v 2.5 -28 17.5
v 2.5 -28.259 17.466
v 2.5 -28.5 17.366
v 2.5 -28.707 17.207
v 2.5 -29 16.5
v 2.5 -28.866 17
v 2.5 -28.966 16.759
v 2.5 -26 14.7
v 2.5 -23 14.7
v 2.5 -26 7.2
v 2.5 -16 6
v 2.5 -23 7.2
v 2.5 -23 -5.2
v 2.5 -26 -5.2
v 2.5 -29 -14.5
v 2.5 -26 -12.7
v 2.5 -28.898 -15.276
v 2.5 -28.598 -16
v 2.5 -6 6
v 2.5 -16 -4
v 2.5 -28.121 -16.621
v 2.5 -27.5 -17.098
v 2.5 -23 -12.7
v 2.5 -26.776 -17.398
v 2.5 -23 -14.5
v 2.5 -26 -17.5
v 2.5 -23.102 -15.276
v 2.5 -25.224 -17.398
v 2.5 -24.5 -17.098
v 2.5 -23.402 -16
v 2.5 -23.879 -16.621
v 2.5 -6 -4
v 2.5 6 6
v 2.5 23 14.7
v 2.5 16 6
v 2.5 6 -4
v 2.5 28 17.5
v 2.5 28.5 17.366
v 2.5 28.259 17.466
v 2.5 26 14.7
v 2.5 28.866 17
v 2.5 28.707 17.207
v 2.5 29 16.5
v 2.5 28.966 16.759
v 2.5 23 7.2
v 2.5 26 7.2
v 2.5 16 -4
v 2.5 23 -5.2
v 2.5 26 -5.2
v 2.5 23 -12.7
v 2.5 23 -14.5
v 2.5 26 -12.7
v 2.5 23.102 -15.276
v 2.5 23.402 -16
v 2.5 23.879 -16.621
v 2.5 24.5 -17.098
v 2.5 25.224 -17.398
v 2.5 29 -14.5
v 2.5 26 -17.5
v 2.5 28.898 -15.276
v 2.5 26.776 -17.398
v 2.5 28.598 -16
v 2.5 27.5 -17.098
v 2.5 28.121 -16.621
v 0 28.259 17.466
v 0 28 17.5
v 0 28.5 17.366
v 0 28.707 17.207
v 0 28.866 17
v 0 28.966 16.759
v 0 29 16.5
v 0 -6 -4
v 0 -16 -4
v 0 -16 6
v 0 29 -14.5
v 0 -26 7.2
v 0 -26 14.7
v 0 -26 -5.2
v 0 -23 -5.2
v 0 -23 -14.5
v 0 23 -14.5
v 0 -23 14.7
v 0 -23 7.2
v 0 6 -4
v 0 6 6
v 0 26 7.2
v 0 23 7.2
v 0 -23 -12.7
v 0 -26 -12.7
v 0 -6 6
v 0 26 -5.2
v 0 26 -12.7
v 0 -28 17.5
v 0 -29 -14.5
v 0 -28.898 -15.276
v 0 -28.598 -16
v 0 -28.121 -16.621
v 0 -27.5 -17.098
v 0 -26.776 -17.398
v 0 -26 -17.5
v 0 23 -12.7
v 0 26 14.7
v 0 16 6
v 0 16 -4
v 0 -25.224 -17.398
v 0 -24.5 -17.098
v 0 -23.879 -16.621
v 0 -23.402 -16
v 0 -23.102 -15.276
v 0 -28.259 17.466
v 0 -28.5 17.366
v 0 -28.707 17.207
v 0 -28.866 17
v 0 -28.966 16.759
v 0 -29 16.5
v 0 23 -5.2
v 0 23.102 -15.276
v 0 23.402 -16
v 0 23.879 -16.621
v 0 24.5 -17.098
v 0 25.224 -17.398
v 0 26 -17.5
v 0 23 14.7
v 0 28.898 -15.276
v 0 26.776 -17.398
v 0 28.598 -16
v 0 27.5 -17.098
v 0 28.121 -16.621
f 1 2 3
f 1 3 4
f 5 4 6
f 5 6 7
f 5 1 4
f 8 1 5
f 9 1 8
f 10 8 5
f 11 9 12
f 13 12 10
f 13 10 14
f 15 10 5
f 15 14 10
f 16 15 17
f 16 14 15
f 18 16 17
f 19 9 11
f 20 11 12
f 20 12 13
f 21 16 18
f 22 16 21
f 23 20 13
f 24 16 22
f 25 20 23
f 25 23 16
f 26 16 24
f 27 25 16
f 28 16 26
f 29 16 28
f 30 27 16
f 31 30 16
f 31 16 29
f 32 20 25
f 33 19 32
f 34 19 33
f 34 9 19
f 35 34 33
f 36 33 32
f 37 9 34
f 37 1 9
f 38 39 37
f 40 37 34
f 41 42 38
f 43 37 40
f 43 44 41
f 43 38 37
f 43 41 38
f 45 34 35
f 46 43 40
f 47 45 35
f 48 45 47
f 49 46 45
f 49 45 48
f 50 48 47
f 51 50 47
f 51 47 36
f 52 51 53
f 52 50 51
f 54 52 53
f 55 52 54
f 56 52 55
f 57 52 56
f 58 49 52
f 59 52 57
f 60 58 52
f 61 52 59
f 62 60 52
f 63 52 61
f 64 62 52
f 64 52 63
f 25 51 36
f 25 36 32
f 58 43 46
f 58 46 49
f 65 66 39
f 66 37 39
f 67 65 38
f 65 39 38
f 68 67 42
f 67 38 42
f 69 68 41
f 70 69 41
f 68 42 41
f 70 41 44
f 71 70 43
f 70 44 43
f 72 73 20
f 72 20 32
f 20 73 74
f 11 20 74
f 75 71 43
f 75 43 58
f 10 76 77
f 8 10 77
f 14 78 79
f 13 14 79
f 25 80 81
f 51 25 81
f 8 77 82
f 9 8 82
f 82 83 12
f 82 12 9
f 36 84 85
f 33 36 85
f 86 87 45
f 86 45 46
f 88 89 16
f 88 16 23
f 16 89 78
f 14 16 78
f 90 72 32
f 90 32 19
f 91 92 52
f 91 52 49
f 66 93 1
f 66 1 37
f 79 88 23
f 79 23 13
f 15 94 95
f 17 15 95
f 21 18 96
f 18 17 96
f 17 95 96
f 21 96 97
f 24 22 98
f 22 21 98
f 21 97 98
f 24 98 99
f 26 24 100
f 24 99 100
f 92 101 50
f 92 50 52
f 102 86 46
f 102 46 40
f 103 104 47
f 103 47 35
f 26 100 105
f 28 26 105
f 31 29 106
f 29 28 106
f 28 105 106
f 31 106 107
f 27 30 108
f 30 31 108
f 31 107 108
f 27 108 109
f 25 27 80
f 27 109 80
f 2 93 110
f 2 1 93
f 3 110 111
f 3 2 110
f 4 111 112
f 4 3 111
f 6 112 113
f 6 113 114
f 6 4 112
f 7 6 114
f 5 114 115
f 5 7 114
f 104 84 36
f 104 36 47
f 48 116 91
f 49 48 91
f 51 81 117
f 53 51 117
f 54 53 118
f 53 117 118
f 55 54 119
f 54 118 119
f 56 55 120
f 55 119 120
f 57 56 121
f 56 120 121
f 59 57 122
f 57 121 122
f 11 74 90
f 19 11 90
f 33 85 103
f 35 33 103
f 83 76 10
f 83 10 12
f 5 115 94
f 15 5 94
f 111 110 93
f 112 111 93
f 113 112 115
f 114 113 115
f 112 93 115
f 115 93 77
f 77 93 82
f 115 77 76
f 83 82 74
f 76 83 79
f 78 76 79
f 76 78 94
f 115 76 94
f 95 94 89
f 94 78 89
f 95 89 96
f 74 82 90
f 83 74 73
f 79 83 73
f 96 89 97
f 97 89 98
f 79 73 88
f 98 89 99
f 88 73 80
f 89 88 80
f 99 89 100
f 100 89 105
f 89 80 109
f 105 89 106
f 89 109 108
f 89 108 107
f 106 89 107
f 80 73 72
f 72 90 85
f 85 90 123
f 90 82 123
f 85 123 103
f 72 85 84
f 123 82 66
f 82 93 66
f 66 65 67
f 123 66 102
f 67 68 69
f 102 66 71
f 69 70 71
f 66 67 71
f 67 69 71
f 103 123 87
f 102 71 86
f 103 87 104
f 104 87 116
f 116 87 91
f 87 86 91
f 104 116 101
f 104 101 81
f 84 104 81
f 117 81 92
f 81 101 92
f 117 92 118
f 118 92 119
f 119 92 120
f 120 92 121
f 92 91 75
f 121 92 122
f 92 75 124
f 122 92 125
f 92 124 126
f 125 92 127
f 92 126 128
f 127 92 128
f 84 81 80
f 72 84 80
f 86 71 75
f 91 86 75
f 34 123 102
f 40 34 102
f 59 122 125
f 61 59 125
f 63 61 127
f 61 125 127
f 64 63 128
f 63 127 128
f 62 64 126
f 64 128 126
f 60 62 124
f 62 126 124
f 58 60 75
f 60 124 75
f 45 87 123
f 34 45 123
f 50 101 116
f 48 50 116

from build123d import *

# Parameters (mm, degrees)
SKETCH_2_W          = 35
SKETCH_2_H          = 58
EXTRUDE_1_DEPTH     = 2.5
SKETCH_4_W          = 7.5
SKETCH_4_H          = 3
CUT_EXTRUDE_1_DEPTH = 3.5
CUT_EXTRUDE_2_DEPTH = 3.5
SKETCH_7_W          = 10
SKETCH_7_H          = 10
CUT_EXTRUDE_3_DEPTH = 3.5
FILLET_1_R          = 1


with BuildPart() as part:
    # 草图2 → 凸台-拉伸1 (new body)
    with BuildSketch(Plane(origin=(0, 0, 0), x_dir=(0, 0, -1), z_dir=(1, 0, 0))):
        Rectangle(SKETCH_2_W, SKETCH_2_H)
    extrude(amount=EXTRUDE_1_DEPTH)

    # 草图4 → 切除-拉伸1 (cut, through all)
    with BuildSketch(Plane.ZY):
        with Locations((-8.95, 24.5)):
            Rectangle(SKETCH_4_W, SKETCH_4_H)
        with Locations((10.95, 24.5)):
            Rectangle(SKETCH_4_W, SKETCH_4_H)
        with Locations((-8.95, -24.5)):
            Rectangle(SKETCH_4_W, SKETCH_4_H)
        with Locations((10.95, -24.5)):
            Rectangle(SKETCH_4_W, SKETCH_4_H)
    extrude(amount=-CUT_EXTRUDE_1_DEPTH, mode=Mode.SUBTRACT)

    # 草图5 → 切除-拉伸2 (cut, through all)
    with BuildSketch(Plane.ZY):
        with BuildLine():
            Line((-17.5, 29), (-17.5, 26.000000007))
            ThreePointArc((-17.5, 26.000000007), (-16.621320341, 28.121320346), (-14.5, 29))
            Line((-14.5, 29), (-17.5, 29))
        make_face()
        with BuildLine():
            Line((-14.5, 0), (-14.5, 23))
            ThreePointArc((-14.5, 23), (-16.621320346, 23.878679659), (-17.5, 26.000000007))
            Line((-17.5, 26.000000007), (-17.5, 0))
            Line((-17.5, 0), (-14.5, 0))
        make_face()
        with BuildLine():
            Line((-14.5, -23), (-14.5, 0))
            Line((-14.5, 0), (-17.5, 0))
            Line((-17.5, 0), (-17.5, -26))
            ThreePointArc((-17.5, -26), (-16.621320344, -23.878679656), (-14.5, -23))
        make_face()
        with BuildLine():
            ThreePointArc((-14.5, -29), (-16.621320344, -28.121320344), (-17.5, -26))
            Line((-17.5, -26), (-17.5, -29))
            Line((-17.5, -29), (-14.5, -29))
        make_face()
    extrude(amount=-CUT_EXTRUDE_2_DEPTH, mode=Mode.SUBTRACT)

    # 草图7 → 切除-拉伸3 (cut, through all)
    with BuildSketch(Plane.ZY):
        with Locations((1, -11)):
            Rectangle(SKETCH_7_W, SKETCH_7_H)
        with Locations((1, 11)):
            Rectangle(SKETCH_7_W, SKETCH_7_H)
    extrude(amount=-CUT_EXTRUDE_3_DEPTH, mode=Mode.SUBTRACT)

    # 圆角1
    fillet_1_edges = [part.edges().sort_by_distance(p)[0] for p in [
        (1.25, -29, 17.5),
        (1.25, 29, 17.5),
    ]]
    fillet(fillet_1_edges, radius=FILLET_1_R)


solid = part.part
